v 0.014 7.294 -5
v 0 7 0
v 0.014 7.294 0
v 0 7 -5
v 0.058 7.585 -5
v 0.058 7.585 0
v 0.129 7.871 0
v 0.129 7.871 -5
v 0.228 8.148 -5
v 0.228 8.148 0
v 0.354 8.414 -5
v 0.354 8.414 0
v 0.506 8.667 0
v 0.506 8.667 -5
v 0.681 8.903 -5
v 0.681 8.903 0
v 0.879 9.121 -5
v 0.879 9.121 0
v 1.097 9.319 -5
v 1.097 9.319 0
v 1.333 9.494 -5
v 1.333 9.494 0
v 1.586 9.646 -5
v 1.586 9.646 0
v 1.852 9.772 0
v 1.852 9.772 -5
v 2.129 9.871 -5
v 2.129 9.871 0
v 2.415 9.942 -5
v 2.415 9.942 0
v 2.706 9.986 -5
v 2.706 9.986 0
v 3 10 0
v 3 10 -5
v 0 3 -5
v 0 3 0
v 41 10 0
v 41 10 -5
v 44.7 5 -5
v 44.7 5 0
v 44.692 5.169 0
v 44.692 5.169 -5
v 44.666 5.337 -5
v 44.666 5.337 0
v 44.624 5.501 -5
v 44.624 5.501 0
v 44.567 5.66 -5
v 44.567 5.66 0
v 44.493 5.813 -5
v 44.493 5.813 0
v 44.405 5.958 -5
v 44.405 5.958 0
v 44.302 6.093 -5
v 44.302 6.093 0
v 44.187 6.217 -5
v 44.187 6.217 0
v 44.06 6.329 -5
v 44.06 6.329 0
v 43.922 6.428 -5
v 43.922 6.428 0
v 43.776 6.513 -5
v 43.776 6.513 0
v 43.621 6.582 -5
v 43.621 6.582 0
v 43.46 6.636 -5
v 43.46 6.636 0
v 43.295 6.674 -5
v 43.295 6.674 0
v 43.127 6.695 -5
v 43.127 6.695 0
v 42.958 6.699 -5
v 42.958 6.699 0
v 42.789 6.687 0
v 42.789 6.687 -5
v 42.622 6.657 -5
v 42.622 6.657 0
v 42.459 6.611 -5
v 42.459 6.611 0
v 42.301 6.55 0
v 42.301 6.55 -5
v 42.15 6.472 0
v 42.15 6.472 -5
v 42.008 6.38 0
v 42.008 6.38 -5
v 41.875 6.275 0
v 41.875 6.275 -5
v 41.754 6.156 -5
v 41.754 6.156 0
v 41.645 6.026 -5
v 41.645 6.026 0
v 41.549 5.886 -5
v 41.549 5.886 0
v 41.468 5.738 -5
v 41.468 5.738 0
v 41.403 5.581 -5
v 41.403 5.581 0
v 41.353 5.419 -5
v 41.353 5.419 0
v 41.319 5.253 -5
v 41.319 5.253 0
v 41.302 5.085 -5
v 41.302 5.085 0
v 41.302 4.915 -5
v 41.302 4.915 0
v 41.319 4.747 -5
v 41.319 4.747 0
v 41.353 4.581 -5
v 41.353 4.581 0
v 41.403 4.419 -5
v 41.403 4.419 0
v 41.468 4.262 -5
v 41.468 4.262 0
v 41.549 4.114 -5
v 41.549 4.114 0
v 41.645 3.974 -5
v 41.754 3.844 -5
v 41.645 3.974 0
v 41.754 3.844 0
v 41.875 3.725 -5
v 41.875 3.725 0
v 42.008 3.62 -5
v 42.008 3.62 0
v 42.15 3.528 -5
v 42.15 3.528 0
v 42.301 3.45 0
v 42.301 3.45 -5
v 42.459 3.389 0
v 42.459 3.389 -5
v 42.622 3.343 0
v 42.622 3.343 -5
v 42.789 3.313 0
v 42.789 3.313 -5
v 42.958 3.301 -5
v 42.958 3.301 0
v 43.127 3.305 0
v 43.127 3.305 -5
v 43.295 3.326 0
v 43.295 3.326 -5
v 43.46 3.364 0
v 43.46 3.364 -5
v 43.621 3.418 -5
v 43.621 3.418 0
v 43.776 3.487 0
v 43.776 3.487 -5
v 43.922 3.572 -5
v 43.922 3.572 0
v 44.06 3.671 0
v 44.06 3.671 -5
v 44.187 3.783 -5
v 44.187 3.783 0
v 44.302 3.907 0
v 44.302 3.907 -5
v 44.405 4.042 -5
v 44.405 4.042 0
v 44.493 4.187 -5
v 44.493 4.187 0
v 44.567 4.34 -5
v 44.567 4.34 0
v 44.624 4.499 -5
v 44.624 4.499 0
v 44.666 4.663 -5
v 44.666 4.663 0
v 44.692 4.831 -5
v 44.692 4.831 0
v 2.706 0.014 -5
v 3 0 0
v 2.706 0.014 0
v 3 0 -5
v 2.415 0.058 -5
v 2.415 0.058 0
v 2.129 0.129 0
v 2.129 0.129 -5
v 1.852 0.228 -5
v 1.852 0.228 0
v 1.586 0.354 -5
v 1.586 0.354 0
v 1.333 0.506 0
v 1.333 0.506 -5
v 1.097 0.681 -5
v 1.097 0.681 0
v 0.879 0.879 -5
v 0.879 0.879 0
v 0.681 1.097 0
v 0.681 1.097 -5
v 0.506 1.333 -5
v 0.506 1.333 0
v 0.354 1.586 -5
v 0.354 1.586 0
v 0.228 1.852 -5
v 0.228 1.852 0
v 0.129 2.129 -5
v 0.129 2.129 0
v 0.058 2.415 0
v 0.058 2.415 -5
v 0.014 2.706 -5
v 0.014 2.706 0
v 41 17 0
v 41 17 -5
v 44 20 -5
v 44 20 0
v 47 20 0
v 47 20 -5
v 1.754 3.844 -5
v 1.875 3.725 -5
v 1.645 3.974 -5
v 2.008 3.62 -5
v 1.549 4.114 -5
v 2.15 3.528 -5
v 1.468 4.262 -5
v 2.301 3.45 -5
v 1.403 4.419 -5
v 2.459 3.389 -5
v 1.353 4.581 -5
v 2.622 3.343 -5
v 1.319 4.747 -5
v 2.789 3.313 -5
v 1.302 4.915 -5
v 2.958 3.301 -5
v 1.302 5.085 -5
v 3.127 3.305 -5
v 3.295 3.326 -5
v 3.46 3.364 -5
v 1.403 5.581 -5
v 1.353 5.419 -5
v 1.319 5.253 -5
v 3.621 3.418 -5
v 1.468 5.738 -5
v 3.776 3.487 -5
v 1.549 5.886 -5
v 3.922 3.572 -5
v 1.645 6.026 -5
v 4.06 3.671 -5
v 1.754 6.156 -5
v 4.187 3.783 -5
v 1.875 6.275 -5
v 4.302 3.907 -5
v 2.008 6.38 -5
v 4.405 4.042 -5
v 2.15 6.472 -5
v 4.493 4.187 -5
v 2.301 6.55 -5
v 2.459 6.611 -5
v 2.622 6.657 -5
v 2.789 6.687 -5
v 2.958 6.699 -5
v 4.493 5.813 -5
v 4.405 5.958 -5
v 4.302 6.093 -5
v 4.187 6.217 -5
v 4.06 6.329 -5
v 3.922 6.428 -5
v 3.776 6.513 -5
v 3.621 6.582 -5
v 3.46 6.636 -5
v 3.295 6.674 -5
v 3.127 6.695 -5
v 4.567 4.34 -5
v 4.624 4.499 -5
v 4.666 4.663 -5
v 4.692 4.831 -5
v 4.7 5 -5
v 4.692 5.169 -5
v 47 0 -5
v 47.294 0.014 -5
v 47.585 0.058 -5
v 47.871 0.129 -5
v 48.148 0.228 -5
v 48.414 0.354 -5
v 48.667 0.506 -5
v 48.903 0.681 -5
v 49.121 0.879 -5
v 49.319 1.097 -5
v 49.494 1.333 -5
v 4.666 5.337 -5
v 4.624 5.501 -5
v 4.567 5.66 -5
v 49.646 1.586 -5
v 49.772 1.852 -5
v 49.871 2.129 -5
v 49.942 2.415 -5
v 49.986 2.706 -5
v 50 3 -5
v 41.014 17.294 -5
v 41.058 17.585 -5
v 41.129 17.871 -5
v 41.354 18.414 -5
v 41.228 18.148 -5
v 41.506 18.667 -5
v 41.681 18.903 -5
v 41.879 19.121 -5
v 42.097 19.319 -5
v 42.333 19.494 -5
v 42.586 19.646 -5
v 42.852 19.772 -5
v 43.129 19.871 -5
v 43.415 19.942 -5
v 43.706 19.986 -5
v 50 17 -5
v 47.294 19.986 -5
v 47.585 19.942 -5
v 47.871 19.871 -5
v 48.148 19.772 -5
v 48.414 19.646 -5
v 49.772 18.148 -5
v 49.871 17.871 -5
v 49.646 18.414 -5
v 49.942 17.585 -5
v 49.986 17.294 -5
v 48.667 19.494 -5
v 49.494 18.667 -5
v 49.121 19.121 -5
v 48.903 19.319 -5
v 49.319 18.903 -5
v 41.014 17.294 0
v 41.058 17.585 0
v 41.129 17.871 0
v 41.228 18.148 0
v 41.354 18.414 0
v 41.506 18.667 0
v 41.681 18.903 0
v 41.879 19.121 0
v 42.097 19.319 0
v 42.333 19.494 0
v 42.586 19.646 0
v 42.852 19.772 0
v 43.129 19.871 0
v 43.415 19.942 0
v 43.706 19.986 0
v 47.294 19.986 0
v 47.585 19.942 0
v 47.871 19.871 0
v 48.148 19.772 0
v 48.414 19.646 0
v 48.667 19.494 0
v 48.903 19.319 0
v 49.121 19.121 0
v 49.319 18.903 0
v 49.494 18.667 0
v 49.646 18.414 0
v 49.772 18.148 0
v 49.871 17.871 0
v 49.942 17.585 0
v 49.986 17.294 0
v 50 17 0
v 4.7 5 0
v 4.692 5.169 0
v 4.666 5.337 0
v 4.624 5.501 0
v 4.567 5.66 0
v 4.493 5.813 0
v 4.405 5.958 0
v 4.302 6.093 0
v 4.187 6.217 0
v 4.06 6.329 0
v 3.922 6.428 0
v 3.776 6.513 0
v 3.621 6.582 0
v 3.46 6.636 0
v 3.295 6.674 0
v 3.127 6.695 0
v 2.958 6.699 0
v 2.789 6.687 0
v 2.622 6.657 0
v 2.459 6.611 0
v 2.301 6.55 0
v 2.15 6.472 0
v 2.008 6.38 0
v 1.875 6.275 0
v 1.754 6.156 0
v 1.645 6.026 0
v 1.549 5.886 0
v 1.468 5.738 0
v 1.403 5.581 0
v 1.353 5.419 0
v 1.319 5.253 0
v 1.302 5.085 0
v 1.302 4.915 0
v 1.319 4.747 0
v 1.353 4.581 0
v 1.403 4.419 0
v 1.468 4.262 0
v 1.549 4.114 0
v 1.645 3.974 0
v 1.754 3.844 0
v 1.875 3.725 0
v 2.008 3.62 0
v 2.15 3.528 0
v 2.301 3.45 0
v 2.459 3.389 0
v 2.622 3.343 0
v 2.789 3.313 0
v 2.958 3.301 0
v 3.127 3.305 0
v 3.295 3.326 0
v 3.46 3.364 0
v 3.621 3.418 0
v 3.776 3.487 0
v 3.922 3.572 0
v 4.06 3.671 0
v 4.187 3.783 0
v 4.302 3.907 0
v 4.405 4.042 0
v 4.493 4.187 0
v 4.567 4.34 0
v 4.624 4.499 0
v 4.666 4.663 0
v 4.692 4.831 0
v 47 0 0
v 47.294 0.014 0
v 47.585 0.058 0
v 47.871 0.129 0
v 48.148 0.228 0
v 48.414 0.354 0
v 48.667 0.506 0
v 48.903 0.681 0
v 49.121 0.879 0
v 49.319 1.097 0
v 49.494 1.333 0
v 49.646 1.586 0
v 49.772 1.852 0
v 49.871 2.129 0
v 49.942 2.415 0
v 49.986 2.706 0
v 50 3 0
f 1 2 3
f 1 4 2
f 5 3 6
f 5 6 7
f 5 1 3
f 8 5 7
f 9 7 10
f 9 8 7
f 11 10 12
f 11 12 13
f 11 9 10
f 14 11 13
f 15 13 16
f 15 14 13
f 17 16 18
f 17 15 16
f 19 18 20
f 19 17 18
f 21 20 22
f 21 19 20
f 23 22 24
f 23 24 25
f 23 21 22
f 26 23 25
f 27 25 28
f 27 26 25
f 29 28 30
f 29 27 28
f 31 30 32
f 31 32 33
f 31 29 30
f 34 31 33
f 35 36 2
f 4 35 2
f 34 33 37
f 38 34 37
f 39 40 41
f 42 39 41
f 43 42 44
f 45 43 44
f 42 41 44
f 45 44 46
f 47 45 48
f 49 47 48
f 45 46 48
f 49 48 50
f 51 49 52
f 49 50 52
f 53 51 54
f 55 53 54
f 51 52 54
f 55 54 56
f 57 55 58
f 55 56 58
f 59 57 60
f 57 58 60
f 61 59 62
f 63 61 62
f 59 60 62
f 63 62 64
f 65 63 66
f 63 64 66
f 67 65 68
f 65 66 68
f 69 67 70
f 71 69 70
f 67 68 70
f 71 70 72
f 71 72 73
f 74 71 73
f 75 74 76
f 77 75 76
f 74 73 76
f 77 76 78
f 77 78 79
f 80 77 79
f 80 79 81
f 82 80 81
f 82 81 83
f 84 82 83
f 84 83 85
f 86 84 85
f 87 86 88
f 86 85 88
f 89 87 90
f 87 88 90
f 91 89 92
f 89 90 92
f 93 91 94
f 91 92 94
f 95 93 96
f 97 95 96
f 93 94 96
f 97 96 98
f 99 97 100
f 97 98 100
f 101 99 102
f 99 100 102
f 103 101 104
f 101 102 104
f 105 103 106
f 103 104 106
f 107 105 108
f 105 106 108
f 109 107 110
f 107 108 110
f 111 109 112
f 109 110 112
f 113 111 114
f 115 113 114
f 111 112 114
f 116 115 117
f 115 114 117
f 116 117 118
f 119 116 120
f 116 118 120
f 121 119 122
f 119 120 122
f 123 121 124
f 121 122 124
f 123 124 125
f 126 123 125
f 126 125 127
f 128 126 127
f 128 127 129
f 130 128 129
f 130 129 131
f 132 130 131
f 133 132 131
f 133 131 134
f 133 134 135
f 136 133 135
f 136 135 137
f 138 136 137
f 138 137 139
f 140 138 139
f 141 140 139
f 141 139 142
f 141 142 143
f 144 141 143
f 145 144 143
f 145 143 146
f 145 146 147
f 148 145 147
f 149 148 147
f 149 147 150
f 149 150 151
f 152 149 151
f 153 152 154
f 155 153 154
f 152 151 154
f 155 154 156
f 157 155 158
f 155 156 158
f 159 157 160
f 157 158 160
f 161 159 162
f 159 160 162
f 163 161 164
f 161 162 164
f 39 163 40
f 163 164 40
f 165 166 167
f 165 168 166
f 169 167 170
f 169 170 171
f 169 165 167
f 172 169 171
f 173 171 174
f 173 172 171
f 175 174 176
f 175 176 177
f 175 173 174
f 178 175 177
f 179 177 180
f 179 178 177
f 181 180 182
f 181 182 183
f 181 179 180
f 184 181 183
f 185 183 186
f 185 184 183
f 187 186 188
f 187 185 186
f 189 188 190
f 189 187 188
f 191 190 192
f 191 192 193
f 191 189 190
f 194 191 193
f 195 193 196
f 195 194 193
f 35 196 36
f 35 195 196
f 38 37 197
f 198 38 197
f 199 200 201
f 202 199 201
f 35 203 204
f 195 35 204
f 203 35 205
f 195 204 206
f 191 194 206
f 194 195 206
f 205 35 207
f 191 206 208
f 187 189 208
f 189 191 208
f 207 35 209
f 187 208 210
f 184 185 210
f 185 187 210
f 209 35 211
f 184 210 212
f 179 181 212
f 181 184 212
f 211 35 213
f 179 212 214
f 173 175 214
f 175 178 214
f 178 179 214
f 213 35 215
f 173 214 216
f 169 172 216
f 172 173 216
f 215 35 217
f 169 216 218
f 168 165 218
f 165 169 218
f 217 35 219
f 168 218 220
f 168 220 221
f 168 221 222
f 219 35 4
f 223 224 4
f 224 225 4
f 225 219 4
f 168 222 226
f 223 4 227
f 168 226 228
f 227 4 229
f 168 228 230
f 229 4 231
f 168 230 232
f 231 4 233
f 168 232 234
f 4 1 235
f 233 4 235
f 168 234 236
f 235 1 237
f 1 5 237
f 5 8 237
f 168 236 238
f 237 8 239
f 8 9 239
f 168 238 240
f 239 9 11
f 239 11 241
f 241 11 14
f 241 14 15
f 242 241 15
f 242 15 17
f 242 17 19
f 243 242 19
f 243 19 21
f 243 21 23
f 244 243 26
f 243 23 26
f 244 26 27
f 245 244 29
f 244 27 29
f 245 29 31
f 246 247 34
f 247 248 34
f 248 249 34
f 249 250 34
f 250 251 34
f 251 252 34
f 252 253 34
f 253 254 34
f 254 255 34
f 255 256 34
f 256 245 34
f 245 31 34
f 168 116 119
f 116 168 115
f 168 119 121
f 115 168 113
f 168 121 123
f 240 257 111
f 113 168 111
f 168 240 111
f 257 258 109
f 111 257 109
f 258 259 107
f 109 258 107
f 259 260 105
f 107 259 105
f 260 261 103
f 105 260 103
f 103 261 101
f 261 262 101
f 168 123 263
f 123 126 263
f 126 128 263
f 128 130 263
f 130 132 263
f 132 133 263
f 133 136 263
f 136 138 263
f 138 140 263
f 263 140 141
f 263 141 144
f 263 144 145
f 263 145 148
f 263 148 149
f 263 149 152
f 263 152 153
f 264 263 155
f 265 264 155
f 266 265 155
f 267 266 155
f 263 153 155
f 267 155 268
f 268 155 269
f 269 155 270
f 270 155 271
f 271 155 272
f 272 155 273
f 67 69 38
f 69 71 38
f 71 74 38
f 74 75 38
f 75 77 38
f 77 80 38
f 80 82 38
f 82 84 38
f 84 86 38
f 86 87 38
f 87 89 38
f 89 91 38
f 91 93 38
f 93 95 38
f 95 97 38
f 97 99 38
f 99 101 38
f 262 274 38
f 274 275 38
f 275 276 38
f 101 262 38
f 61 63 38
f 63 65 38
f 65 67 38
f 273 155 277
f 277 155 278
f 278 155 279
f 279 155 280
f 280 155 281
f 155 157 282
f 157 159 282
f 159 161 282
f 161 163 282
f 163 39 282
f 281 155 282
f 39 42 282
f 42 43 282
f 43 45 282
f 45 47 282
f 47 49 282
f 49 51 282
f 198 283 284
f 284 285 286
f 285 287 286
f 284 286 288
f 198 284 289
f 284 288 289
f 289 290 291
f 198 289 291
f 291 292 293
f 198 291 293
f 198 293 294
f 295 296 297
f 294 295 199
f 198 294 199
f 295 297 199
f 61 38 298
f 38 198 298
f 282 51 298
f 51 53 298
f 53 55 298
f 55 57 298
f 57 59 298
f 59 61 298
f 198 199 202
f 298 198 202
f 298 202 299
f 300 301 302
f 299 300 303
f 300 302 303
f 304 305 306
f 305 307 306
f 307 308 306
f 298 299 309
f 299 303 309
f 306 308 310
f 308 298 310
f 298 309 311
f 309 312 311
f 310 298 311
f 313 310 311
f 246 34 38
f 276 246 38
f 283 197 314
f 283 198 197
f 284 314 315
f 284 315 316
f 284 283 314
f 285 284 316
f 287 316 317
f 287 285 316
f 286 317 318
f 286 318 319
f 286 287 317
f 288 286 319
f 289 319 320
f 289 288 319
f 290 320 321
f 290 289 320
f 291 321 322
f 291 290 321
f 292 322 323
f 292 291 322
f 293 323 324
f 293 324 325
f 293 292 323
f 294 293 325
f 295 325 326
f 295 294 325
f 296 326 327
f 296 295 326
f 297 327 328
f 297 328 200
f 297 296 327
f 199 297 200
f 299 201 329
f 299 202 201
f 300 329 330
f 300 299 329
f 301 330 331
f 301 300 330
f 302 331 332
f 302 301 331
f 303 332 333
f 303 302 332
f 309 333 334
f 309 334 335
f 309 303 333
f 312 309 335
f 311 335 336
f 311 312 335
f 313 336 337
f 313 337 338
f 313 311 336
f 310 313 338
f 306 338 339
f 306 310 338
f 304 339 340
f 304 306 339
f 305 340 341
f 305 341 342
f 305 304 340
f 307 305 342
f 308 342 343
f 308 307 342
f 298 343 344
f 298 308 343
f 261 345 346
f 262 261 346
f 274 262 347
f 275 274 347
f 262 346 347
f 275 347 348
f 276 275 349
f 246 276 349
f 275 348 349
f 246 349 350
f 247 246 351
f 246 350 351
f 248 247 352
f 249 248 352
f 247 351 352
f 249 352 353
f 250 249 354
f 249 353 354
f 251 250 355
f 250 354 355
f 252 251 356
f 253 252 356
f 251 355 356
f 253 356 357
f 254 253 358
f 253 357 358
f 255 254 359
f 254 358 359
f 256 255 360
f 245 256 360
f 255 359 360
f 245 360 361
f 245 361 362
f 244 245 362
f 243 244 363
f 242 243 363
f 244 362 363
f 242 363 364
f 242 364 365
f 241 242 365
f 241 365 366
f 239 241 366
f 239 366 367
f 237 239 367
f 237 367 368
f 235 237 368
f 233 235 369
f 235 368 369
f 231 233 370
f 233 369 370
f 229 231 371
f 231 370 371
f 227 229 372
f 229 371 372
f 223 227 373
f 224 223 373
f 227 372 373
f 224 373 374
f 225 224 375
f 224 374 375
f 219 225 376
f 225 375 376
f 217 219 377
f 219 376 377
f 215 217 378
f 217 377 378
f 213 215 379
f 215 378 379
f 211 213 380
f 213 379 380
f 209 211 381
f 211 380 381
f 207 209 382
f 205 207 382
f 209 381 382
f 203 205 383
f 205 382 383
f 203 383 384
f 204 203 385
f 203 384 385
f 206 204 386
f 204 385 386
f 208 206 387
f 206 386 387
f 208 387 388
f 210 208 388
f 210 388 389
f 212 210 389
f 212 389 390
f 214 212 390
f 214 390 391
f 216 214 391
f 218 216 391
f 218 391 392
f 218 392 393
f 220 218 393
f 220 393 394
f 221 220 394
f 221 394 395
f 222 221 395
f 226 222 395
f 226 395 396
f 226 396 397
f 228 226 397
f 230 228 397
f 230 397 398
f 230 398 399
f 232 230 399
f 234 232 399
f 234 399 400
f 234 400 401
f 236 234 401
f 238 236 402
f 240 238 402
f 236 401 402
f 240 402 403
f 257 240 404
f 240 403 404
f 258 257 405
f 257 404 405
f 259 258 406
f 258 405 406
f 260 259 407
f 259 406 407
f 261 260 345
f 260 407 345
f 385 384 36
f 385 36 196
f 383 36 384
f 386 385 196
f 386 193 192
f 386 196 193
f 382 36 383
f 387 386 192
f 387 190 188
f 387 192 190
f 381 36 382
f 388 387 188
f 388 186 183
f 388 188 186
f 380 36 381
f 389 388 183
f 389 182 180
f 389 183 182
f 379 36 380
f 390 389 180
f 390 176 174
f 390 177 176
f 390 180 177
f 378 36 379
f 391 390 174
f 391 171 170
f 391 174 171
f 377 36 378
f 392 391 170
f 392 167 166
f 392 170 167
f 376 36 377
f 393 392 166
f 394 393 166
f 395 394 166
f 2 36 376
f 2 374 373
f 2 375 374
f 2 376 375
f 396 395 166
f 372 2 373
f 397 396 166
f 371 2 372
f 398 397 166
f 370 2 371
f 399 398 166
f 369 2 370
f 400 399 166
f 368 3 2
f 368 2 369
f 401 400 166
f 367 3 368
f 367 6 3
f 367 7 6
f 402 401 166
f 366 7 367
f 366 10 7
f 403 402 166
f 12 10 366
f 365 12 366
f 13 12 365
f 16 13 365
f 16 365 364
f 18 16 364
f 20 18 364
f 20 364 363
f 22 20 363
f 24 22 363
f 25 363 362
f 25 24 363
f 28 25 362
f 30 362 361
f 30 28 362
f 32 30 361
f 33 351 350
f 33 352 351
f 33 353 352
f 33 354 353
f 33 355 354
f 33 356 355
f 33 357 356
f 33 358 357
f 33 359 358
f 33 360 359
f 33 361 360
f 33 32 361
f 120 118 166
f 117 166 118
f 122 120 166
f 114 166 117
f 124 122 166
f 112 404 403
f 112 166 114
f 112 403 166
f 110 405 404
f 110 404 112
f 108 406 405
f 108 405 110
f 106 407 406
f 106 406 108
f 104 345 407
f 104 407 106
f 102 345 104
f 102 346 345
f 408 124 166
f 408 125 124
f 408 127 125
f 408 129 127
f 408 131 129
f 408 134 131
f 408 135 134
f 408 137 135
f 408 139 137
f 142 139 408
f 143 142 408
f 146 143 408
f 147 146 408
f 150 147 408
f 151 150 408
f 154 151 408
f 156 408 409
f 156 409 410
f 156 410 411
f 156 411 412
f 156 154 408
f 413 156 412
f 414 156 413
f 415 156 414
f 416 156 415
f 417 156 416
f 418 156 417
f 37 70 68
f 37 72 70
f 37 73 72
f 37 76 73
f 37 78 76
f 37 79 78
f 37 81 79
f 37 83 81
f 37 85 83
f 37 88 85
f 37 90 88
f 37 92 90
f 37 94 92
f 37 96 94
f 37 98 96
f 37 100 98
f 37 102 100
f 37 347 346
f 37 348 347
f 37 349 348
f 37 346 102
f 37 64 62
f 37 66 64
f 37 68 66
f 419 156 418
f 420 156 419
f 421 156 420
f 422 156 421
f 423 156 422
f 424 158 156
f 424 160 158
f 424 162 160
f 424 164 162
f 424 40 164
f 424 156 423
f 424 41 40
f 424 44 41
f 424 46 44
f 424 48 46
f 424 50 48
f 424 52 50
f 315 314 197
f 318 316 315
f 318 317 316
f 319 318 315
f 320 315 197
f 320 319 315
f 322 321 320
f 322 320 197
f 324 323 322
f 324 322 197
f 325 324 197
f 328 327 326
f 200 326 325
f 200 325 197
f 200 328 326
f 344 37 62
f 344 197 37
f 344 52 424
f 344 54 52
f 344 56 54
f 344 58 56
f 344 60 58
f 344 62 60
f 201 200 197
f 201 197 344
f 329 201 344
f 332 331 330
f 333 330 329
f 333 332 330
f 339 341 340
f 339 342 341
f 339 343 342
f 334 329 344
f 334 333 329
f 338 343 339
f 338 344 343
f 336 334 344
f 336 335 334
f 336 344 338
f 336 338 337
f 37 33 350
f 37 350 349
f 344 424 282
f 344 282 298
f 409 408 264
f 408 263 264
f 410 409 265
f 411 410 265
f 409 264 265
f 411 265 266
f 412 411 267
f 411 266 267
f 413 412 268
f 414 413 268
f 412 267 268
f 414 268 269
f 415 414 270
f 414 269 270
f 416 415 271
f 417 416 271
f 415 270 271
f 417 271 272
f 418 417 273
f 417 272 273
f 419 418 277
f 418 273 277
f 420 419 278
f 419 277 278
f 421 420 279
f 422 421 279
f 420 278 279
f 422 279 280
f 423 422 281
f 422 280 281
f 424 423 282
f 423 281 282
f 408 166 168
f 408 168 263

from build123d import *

# Parameters (mm, degrees)
SKETCH_1_W          = 46
SKETCH_1_H          = 20
SKETCH_1_R          = 1.7
EXTRUDE_1_DEPTH     = 5
SKETCH_3_W          = 41
SKETCH_3_H          = 10
CUT_EXTRUDE_1_DEPTH = 5
FILLET_1_R          = 3
SKETCH_4_W          = 4
SKETCH_4_H          = 20
EXTRUDE_2_DEPTH     = 5
FILLET_2_R          = 3
FILLET_3_R          = 3


with BuildPart() as part:
    # 草图1 → 凸台-拉伸1 (new body)
    with BuildSketch(Plane.XY):
        with Locations((23, 10)):
            Rectangle(SKETCH_1_W, SKETCH_1_H)
        with Locations((3, 5)):
            Circle(SKETCH_1_R, mode=Mode.SUBTRACT)
        with Locations((43, 5)):
            Circle(SKETCH_1_R, mode=Mode.SUBTRACT)
    extrude(amount=-EXTRUDE_1_DEPTH)

    # 草图3 → 切除-拉伸1 (cut)
    with BuildSketch(Plane.XY):
        with Locations((20.5, 15)):
            Rectangle(SKETCH_3_W, SKETCH_3_H)
    extrude(amount=-CUT_EXTRUDE_1_DEPTH, mode=Mode.SUBTRACT)

    # 圆角1
    fillet_1_edges = [part.edges().sort_by_distance(p)[0] for p in [
        (0, 10, -2.5),
        (41, 20, -2.5),
    ]]
    fillet(fillet_1_edges, radius=FILLET_1_R)

    # 草图4 → 凸台-拉伸2 (add)
    with BuildSketch(Plane.XY):
        with Locations((48, 10)):
            Rectangle(SKETCH_4_W, SKETCH_4_H)
    extrude(amount=-EXTRUDE_2_DEPTH)

    # 圆角2
    fillet_2_edges = [part.edges().sort_by_distance(p)[0] for p in [
        (50, 20, -2.5),
        (50, 0, -2.5),
    ]]
    fillet(fillet_2_edges, radius=FILLET_2_R)

    # 圆角3
    fillet_3_edges = [part.edges().sort_by_distance(p)[0] for p in [
        (0, 0, -2.5),
    ]]
    fillet(fillet_3_edges, radius=FILLET_3_R)


solid = part.part
